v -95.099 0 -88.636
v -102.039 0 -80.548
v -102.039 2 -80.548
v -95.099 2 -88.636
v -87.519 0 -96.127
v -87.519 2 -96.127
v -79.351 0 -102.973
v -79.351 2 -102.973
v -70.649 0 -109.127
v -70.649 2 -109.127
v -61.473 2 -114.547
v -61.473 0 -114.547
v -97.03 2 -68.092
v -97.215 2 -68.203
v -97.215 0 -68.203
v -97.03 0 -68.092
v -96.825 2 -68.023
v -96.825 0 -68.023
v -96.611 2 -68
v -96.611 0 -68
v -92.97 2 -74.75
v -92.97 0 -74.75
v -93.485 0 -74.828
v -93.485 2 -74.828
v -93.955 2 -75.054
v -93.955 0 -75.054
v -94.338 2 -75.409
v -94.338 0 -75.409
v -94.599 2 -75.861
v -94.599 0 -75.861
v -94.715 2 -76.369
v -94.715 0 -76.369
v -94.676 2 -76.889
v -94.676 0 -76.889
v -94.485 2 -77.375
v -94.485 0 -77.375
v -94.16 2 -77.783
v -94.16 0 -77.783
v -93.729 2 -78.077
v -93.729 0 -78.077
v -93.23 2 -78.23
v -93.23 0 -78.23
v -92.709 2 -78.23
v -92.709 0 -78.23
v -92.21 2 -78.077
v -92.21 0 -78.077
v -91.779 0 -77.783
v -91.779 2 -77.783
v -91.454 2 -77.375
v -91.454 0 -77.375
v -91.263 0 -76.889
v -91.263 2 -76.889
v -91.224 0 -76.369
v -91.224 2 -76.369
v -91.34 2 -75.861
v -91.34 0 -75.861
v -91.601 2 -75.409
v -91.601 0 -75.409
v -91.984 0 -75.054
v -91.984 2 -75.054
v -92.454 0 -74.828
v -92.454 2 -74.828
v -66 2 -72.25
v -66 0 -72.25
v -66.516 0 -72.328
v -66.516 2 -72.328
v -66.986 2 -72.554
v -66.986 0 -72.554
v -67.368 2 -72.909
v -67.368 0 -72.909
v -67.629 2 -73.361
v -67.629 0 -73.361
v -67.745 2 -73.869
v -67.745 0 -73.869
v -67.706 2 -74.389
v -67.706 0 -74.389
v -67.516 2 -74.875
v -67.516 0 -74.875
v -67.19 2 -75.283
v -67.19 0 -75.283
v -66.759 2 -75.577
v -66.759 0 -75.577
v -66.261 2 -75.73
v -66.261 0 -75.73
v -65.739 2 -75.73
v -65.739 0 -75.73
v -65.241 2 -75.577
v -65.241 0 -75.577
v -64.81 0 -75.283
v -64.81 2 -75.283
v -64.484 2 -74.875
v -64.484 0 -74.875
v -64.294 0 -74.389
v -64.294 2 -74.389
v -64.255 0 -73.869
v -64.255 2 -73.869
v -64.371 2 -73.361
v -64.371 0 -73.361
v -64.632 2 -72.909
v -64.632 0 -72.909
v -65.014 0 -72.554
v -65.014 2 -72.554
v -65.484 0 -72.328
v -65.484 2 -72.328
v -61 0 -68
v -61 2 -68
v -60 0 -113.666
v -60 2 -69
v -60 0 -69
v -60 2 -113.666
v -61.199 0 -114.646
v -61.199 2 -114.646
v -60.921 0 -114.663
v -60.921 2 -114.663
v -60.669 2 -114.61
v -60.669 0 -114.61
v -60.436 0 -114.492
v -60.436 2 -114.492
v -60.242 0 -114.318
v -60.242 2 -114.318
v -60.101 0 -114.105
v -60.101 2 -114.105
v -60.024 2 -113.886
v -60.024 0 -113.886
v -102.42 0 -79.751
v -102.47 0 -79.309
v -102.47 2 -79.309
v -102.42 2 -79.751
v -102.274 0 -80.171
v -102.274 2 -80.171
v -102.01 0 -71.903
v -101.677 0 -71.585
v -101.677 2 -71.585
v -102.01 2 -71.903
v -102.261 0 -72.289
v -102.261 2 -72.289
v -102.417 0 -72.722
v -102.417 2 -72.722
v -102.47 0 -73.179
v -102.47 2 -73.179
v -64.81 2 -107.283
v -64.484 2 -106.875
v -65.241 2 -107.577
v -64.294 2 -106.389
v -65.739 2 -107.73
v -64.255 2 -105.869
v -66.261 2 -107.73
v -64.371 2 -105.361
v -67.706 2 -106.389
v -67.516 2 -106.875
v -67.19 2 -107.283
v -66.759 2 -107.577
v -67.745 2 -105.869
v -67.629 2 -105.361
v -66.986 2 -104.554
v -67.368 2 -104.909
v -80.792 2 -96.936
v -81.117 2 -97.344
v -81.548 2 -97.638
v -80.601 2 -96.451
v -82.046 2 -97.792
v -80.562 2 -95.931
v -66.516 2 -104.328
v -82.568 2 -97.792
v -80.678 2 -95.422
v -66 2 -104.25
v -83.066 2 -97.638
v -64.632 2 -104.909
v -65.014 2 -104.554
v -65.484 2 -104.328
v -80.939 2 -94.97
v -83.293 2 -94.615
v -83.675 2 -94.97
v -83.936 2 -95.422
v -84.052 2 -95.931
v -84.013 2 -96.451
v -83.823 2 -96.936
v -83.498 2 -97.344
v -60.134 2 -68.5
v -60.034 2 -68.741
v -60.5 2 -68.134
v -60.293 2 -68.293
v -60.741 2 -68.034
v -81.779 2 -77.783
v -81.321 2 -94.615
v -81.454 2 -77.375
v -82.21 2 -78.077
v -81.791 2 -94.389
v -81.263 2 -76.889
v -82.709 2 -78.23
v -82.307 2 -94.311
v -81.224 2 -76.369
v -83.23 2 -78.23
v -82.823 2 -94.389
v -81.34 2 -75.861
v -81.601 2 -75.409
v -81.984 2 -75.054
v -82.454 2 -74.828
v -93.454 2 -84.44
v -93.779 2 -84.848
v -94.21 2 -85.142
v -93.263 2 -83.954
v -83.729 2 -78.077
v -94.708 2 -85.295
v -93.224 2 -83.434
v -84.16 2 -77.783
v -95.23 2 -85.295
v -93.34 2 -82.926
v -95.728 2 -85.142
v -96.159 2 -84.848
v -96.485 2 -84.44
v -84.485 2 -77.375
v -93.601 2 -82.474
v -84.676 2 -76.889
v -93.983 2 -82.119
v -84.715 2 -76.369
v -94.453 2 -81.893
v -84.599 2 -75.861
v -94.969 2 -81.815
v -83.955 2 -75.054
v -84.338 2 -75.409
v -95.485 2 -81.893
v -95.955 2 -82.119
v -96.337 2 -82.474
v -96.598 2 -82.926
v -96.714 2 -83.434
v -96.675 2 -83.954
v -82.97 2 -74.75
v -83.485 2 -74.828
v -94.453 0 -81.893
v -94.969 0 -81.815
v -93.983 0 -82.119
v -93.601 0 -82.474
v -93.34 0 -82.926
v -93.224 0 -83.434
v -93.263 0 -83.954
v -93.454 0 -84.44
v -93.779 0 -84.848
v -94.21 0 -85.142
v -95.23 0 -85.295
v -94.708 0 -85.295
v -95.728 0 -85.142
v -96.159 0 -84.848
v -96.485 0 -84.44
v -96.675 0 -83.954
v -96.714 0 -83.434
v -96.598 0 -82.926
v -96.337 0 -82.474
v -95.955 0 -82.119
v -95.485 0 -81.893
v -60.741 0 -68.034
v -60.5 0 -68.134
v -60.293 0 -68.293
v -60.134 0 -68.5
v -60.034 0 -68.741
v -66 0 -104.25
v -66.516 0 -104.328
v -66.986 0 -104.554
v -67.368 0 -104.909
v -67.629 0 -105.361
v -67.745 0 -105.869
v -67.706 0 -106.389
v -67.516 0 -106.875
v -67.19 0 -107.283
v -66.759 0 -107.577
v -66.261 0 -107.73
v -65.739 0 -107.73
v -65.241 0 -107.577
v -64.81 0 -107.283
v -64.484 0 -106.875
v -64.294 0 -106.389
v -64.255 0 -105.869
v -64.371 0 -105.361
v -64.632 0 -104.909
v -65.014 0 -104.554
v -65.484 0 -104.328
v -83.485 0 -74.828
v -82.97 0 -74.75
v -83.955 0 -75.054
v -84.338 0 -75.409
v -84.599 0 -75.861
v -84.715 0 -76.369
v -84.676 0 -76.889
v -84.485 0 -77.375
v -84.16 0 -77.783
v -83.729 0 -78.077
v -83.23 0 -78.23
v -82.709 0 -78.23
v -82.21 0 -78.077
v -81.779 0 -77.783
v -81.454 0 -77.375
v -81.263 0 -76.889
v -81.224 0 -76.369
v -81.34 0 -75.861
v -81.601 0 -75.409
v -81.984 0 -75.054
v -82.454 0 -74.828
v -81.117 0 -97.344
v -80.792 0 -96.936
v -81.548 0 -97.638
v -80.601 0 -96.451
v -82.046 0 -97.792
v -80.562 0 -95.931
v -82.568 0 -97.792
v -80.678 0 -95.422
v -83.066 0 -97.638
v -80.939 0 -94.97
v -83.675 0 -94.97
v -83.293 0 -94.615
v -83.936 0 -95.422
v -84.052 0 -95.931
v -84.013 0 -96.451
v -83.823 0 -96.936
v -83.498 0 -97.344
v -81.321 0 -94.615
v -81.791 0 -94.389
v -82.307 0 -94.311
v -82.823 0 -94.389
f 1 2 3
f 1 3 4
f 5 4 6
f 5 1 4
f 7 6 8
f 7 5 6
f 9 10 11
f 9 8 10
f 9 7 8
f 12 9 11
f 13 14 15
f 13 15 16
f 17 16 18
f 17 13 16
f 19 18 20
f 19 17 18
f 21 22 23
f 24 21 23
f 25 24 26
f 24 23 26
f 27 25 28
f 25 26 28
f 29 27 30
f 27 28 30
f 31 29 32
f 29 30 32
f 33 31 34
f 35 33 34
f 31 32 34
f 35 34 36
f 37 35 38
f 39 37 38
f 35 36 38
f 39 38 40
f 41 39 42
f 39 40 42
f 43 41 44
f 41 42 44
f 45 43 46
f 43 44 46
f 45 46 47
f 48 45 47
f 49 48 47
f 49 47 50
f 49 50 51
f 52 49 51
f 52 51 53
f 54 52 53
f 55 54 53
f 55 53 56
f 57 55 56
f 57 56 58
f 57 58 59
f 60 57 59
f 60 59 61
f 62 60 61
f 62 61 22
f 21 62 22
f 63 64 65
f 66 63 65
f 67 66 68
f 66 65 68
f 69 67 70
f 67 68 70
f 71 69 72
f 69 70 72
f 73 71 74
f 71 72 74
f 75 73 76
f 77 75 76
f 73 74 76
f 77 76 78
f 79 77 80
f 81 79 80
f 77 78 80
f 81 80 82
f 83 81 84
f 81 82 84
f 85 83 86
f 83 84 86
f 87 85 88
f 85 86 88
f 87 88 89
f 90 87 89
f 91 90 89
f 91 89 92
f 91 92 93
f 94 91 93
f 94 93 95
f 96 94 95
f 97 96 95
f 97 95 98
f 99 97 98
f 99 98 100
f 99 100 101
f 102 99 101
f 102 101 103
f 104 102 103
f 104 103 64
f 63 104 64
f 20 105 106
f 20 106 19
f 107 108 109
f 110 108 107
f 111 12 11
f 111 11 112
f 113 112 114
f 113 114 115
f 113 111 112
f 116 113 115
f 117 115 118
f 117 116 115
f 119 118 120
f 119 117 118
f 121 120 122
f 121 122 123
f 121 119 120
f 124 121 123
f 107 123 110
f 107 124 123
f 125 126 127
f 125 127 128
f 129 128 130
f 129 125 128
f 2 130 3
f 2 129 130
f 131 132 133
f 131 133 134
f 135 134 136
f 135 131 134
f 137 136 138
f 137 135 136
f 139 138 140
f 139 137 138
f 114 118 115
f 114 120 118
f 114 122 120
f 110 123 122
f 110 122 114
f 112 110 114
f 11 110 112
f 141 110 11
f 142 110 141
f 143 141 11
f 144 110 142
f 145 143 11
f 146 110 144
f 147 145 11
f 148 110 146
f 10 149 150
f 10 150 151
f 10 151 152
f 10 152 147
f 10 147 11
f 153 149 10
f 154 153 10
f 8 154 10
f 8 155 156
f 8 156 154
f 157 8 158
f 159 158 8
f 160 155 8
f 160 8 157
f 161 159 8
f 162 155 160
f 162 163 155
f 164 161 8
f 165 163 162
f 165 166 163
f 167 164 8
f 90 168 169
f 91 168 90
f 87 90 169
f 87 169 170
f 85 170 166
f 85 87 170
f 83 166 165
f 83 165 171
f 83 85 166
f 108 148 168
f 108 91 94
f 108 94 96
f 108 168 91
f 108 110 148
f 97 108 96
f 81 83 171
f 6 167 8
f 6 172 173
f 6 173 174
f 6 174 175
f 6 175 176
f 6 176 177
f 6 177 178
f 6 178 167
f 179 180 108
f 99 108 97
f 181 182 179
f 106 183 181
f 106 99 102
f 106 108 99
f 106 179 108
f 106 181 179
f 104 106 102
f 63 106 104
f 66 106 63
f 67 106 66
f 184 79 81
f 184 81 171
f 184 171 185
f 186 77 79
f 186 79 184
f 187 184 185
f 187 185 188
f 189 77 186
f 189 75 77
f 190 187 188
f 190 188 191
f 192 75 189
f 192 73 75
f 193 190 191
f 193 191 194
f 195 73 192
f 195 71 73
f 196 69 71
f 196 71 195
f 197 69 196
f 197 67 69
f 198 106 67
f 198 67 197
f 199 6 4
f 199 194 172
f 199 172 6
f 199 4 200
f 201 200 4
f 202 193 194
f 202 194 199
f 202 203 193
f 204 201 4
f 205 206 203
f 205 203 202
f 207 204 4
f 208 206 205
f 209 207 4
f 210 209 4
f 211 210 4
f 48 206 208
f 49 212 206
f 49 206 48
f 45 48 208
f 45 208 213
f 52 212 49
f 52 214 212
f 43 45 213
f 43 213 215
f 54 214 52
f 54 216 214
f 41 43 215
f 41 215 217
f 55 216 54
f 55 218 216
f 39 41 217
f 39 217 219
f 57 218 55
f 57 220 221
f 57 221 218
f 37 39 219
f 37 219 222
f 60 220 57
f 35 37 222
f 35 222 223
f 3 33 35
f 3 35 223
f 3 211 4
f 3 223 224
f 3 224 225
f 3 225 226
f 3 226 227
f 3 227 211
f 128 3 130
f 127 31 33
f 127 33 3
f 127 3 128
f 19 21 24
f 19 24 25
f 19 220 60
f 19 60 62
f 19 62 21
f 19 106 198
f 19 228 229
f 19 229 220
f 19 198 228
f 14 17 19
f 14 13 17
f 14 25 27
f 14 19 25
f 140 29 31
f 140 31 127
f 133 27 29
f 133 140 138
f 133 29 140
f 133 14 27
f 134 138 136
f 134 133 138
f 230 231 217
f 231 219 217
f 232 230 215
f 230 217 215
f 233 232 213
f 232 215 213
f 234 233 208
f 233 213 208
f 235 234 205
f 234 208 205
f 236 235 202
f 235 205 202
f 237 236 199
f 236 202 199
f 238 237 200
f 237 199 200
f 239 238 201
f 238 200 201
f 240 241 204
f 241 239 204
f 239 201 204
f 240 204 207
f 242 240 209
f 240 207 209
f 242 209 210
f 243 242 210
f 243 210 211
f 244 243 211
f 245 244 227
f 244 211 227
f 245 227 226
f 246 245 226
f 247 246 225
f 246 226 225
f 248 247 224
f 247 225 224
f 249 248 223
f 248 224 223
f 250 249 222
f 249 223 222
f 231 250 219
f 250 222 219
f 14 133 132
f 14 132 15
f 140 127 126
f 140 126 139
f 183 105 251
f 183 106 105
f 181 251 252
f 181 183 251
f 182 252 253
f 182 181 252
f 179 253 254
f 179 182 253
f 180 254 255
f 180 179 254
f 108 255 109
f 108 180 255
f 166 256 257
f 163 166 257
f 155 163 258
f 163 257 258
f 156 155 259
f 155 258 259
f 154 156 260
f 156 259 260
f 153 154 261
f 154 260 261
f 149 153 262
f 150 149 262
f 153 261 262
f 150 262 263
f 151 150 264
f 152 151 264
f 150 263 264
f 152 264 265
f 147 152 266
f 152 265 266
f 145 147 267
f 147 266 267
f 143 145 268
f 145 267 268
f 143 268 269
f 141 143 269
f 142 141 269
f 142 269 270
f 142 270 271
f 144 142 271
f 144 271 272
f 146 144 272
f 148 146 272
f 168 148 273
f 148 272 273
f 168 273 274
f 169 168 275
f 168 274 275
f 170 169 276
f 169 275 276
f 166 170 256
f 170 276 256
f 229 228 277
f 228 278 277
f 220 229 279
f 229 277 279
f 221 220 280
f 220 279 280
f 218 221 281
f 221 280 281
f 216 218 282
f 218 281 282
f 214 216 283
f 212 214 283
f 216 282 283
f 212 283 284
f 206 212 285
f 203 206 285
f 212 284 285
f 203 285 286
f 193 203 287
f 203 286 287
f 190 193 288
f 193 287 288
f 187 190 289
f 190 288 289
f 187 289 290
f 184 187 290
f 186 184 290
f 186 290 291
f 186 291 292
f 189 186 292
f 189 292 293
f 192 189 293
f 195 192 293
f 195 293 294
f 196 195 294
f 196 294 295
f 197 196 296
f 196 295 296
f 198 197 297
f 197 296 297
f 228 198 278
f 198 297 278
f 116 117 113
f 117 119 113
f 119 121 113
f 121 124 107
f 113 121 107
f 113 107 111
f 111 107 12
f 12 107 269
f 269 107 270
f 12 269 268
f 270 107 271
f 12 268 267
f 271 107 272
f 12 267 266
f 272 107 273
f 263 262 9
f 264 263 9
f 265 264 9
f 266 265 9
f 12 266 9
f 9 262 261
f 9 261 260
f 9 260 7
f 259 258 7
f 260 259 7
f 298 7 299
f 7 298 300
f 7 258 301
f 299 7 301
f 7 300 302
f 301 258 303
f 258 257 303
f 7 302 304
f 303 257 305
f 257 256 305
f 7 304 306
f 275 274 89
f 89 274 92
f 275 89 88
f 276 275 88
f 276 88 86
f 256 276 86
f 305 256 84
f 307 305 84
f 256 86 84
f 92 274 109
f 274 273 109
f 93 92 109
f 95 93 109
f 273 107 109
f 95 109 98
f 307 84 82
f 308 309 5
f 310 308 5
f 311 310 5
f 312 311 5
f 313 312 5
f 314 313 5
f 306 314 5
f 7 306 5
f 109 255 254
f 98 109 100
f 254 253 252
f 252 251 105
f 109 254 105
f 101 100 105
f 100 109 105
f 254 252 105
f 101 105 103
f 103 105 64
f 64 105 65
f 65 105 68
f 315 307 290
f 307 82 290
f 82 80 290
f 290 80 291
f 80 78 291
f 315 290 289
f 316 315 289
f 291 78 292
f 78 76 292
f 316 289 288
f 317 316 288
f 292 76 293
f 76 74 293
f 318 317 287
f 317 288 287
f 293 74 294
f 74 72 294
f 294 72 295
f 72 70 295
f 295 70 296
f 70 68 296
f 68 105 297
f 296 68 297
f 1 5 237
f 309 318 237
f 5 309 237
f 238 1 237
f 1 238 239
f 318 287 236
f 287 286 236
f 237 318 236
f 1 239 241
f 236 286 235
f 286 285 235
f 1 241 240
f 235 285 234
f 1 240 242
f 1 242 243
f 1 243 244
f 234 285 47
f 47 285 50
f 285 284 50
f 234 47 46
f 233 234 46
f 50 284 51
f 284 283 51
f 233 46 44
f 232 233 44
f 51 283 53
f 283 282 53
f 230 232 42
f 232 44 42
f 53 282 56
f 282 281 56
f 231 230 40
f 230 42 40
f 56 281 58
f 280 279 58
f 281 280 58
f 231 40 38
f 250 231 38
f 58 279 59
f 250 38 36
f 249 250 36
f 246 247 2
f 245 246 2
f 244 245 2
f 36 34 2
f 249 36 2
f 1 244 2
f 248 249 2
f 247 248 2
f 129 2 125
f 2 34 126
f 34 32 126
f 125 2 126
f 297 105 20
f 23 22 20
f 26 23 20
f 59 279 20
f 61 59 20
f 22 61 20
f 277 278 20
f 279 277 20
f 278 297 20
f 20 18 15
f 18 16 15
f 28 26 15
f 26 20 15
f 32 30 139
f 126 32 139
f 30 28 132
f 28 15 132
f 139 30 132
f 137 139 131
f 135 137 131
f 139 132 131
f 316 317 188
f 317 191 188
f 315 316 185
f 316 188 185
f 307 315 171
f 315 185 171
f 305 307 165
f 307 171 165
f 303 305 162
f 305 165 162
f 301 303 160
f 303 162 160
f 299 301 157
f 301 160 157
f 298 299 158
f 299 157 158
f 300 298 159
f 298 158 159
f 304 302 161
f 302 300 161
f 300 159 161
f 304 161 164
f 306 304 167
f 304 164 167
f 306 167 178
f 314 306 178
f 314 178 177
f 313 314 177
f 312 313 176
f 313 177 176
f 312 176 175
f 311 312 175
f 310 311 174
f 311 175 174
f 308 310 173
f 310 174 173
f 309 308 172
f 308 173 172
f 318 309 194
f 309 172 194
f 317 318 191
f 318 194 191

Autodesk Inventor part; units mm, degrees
ref_plane "YZ Plane" through (0, 0, 0) normal (1, 0, 0) x (0, 1, 0)
ref_plane "XZ Plane" through (0, 0, 0) normal (0, 1, 0) x (-1, 0, 0)
ref_plane "XY Plane" through (0, 0, 0) normal (0, 0, 1) x (1, 0, 0)
sketch "スケッチ1" plane through (0, 0, 0) normal (0, 1, 0) x (-1, 0, 0)
  circle A0 centre (0, 0) radius 130
  dimension "d0" = 260
extrude "プレート1" add sketch "スケッチ1" along normal blind 2
sketch "スケッチ2" plane through (0, 2, 0) normal (0, 1, 0) x (1, 0, 0)
  line L0 (85, -40) -> (109, -40)
  line L1 (109, -40) -> (109, 40)
  line L2 (109, 40) -> (85, 40)
  line L3 (85, 40) -> (85, -40)
  line L4 (85, -40) -> (109, 40) construction
  line L5 (109, -40) -> (85, 40) construction
  point P0 (0, 0)
  point P1 (97, 0)
  dimension "d2" = 24
  dimension "d3" = 85
  dimension "d6" = 80
extrude "押し出し1" cut sketch "スケッチ2" against normal through all
fillet "フィレット1" radius 10 4 edges at (109, 1, 40) (85, 1, 40) (85, 1, -40) (109, 1, -40)
sketch "スケッチ3" plane through (0, 2, 0) normal (0, 1, 0) x (1, 0, 0)
  line L0 (85, -30) -> (85, 30) projected
  line L1 (109, 30) -> (109, -30) projected
  line L2 (95, 40) -> (99, 40) projected
  line L3 (99, -40) -> (95, -40) projected
  line L4 (82, -20) -> (112, -20) construction
  line L5 (112, -20) -> (112, 20) construction
  line L6 (112, 20) -> (82, 20) construction
  line L7 (82, 20) -> (82, -20) construction
  line L8 (82, -20) -> (112, 20) construction
  line L9 (112, -20) -> (82, 20) construction
  point P0 (0, 0)
  point P1 (97, 0)
  point P2 (97, 40)
  point P3 (109, 0)
  dimension "d8" = 30
  dimension "d9" = 40
hole "穴1" at (82, 2, 20) at (112, 2, 20) at (112, 2, -20) at (82, 2, -20) direction (0, -1, 0) diameter 3.5 depth 2 tip angle 118
sketch "スケッチ4" plane through (0, 2, 0) normal (0, 1, 0) x (1, 0, 0)
  circle A0 centre (0, 0) radius 130 projected
  line L0 (-106.1838, 75) -> (-60, 40)
  line L1 (-60, 40) -> (-60, -40)
  line L2 (-60, -40) -> (-106.1838, -75)
  point P0 (-60, 0)
  dimension "d17" = 40
  dimension "d18" = 75
  dimension "d19" = 60
extrude "押し出し2" cut sketch "スケッチ4" against normal through all contours L0 L1 L2 A0 picked at (-83.3333, 0)
sketch "スケッチ5" plane through (0, 2, 0) normal (0, 1, 0) x (1, 0, 0)
  line L0 (-47.5, 87) -> (47.5, 87)
  line L1 (47.5, 87) -> (47.5, 106)
  line L2 (47.5, 106) -> (-47.5, 106)
  line L3 (-47.5, 106) -> (-47.5, 87)
  line L4 (-47.5, 87) -> (47.5, 106) construction
  line L5 (47.5, 87) -> (-47.5, 106) construction
  line L6 (-13.5, 81.5) -> (13.5, 81.5)
  line L7 (13.5, 81.5) -> (13.5, 87)
  line L8 (13.5, 87) -> (-13.5, 87)
  line L9 (-13.5, 87) -> (-13.5, 81.5)
  line L10 (-13.5, 81.5) -> (13.5, 87) construction
  line L11 (13.5, 81.5) -> (-13.5, 87) construction
  line L12 (-13.5, 81.5) -> (-12.7575, 82.2425) construction
  line L13 (-13.5, 81.5) -> (-12.45, 81.5) construction
  line L14 (13.5, 81.5) -> (12.7575, 82.2425) construction
  line L15 (13.5, 81.5) -> (14.55, 81.5) construction
  circle A0 centre (12.7575, 82.2425) radius 1.05
  circle A1 centre (-12.7575, 82.2425) radius 1.05
  line L16 (47.5, 87) -> (62.5, 87)
  line L17 (62.5, 87) -> (62.5, 97)
  line L18 (62.5, 97) -> (47.5, 97)
  line L19 (47.5, 97) -> (47.5, 87)
  line L20 (-13.5, 111.5) -> (13.5, 111.5)
  line L21 (13.5, 111.5) -> (13.5, 106)
  line L22 (13.5, 106) -> (-13.5, 106)
  line L23 (-13.5, 106) -> (-13.5, 111.5)
  line L24 (-13.5, 111.5) -> (13.5, 106) construction
  line L25 (13.5, 111.5) -> (-13.5, 106) construction
  line L26 (-13.5, 111.5) -> (-12.7575, 110.7575) construction
  line L27 (-13.5, 111.5) -> (-12.45, 111.5) construction
  line L28 (13.5, 111.5) -> (12.7575, 110.7575) construction
  line L29 (13.5, 111.5) -> (14.55, 111.5) construction
  circle A2 centre (-12.7575, 110.7575) radius 1.05
  circle A3 centre (12.7575, 110.7575) radius 1.05
  point P0 (0, 0)
  point P1 (0, 96.5)
  point P2 (0, 84.25)
  point P3 (-13.5, 82.9849)
  point P4 (-12.0151, 81.5)
  point P5 (12.0151, 81.5)
  point P6 (13.5, 82.9849)
  point P7 (47.5, 97)
  point P8 (0, 108.75)
  point P9 (-13.5, 110.0151)
  point P10 (13.5, 110.0151)
  point P11 (12.0151, 111.5)
  point P12 (-12.0151, 111.5)
  dimension "d22" = 19
  dimension "d23" = 95
  dimension "d24" = 87
  dimension "d25" = 5.5
  dimension "d26" = 27
  dimension "d27" = 1.05
  dimension "d28" = 45
  dimension "d29" = 1.05
  dimension "d30" = 135
  dimension "d44" = 10
  dimension "d45" = 15
  dimension "d46" = 5.5
  dimension "d47" = 1.05
  dimension "d48" = 45
  dimension "d49" = 1.05
  dimension "d50" = 135
extrude "押し出し3" cut sketch "スケッチ5" against normal through all
sketch "スケッチ6" plane through (0, 2, 0) normal (0, 1, 0) x (1, 0, 0)
  line L0 (-20, 84) -> (20, 84) construction
  line L1 (-20, 84) -> (20, 84) construction
  line L2 (12.0151, 81.5) -> (-12.0151, 81.5) construction
  line L3 (-20, 109) -> (20, 109) construction
  line L4 (13.5, 106) -> (47.5, 106) construction
  line L5 (-20, 109) -> (20, 109) construction
  line L6 (-12.0151, 111.5) -> (12.0151, 111.5) construction
  point P0 (0, 0)
  point P1 (0, 84)
  point P2 (0, 109)
  point P3 (0, 84)
  dimension "d33" = 40
  dimension "d34" = 0
  dimension "d35" = 2.5
  dimension "d51" = 40
  dimension "d52" = 0
  dimension "d53" = 2.5
hole "穴2" at (20, 2, -84) at (-20, 2, -84) at (-20, 2, -109) at (20, 2, -109) direction (0, -1, 0) diameter 3.5 depth 2 tip angle 118
fillet "フィレット2" radius 1 4 edges at (-13.5, 1, -87) (13.5, 1, -87) (-13.5, 1, -106) (13.5, 1, -106)
fillet "フィレット3" radius 3 6 edges at (-47.5, 1, -87) (-47.5, 1, -106) (47.5, 1, -106) (47.5, 1, -97) (62.5, 1, -97) (62.5, 1, -87)
mirror "ミラー1" about plane through (0, 0, 0) normal (0, 0, 1) of "穴2", "押し出し3", "フィレット2", "フィレット3"
sketch "スケッチ7" plane through (0, 2, 0) normal (0, 1, 0) x (1, 0, 0)
  arc A0 (-106.1838, -75) -> (-106.1838, 75) centre (0, 0) ccw projected
  line L0 (-48.7827, 120.5) -> (48.7827, 120.5)
  line L1 (-48.7827, -120.5) -> (48.7827, -120.5)
  line L2 (123, -42.0833) -> (123, 42.0833)
  line L3 (-12.0151, 111.5) -> (12.0151, 111.5) projected
  circle A1 centre (112, 20) radius 1.75 projected
  line L4 (12.0151, -111.5) -> (-12.0151, -111.5) projected
  dimension "d55" = 9
  dimension "d56" = 11
  dimension "d57" = 9
extrude "押し出し4" cut sketch "スケッチ7" against normal through all contours L1 A0 | L2 A0 | L0 A0
fillet "フィレット4" radius 50 6 edges at (48.7827, 1, 120.5) (-48.7827, 1, 120.5) (123, 1, -42.0833) (123, 1, 42.0833) (-48.7827, 1, -120.5) (48.7827, 1, -120.5)
sketch "スケッチ8" plane through (0, 0, 0) normal (0, -1, 0) x (1, 0, 0)
  arc A0 (97.4046, 79.5902) -> (95.9996, 79.4659) centre (96.7931, 78.5) ccw projected
  arc A1 (52.5865, 79.4659) -> (51.1816, 79.5902) centre (51.7931, 78.5) ccw projected
  point P0 (0, 0)
hole "穴3" at (96.7931, 0, 78.5) at (51.7931, 0, 78.5) direction (0, 1, 0) diameter 3.5 depth 2 tip angle 118
sketch "スケッチ10" plane through (0, 2, 0) normal (0, 1, 0) x (1, 0, 0)
  line L0 (-32.5, -116.5) -> (32.5, -116.5) construction
  line L1 (-32.5, -116.5) -> (32.5, -116.5) construction
  line L2 (-37.812, -120.5) -> (37.812, -120.5) construction
  point P0 (0, 0)
  point P1 (0, -116.5)
  dimension "d78" = 65
  dimension "d79" = 0
  dimension "d80" = 4
hole "穴5" at (32.5, 2, 116.5) at (-32.5, 2, 116.5) direction (0, -1, 0) diameter 3.5 end through all
mirror "ミラー2" about plane through (0, 0, 0) normal (0, 0, 1) of "穴3", "穴5"
sketch "スケッチ9" plane through (0, 2, 0) normal (0, 1, 0) x (1, 0, 0)
  line L0 (110, -55) -> (110, 55) construction
  line L1 (109, 30) -> (109, -30) construction
  line L2 (110, -55) -> (220, -55) construction
  point P0 (0, 0)
  point P1 (110, 0)
  dimension "d68" = 110
  dimension "d69" = 90
  dimension "d70" = 110
hole "穴4" at (110, 2, 55) at (110, 2, -55) direction (0, -1, 0) diameter 3.5 depth 2 tip angle 118
sketch "スケッチ11" plane through (0, 2, 0) normal (0, 1, 0) x (1, 0, 0)
  line L0 (-45, 7.5) -> (40, 7.5) construction
  line L1 (40, 7.5) -> (40, 72.5) construction
  line L2 (40, 72.5) -> (-45, 72.5) construction
  line L3 (-45, 72.5) -> (-45, 7.5) construction
  line L4 (-45, 7.5) -> (40, 72.5) construction
  line L5 (40, 7.5) -> (-45, 72.5) construction
  line L6 (-60, 40) -> (-60, -40) construction
  point P0 (0, 0)
  point P1 (-2.5, 40)
  dimension "d88" = 85
  dimension "d89" = 65
  dimension "d90" = 7.5
  dimension "d91" = 15
hole "穴6" at (-45, 2, -7.5) at (40, 2, -7.5) at (40, 2, -72.5) at (-45, 2, -72.5) direction (0, -1, 0) diameter 2.5 end through all
sketch "スケッチ12" plane through (0, 2, 0) normal (0, 1, 0) x (1, 0, 0)
  line L0 (-15, 40) -> (10, 40) construction
  line L1 (-15, 10) -> (10, 10)
  line L2 (10, 70) -> (-15, 70)
  arc A0 (-15, 70) -> (-15, 10) centre (-15, 40) ccw
  arc A1 (10, 10) -> (10, 70) centre (10, 40) ccw
  circle A2 centre (-45, 72.5) radius 1.25 projected
  circle A3 centre (-45, 7.5) radius 1.25 projected
  point P0 (0, 0)
  point P1 (-2.5, 40)
  dimension "d99" = 25
  dimension "d100" = 30
  dimension "d101" = 42.5
  dimension "d102" = 32.5
extrude "押し出し5" cut sketch "スケッチ12" against normal through all contours A0 L2 A1 L1
mirror "ミラー3" about plane through (0, 0, 0) normal (0, 0, 1) of "穴6", "押し出し5"
sketch "スケッチ13" plane through (0, 2, 0) normal (0, 1, 0) x (1, 0, 0)
  line L0 (-15, 0) -> (15, 0) construction
  line L1 (-15, 0) -> (15, 0) construction
  point P0 (0, 0)
  point P1 (0, 0)
  dimension "d105" = 30
  dimension "d106" = 0
hole "穴7" at (-15, 2, 0) at (15, 2, 0) direction (0, -1, 0) diameter 2.5 end through all
sketch "スケッチ14" plane through (0, 2, 0) normal (0, 1, 0) x (1, 0, 0)
  line L0 (-106.1838, 75) -> (-60, 40) projected
  arc A0 (-61.4446, 114.5625) -> (-106.1838, 75) centre (0, 0) ccw projected
  line L1 (-60, -40) -> (-106.1838, -75) projected
  arc A1 (-106.1838, -75) -> (-61.4446, -114.5625) centre (0, 0) ccw projected
  line L2 (-102.4695, 80) -> (-102.4695, -80)
  line L3 (-102.4695, 80) -> (57.5305, 80) construction
  point P0 (-102.4695, 72.1852)
  point P1 (-102.4695, -72.1852)
  dimension "d114" = 160
  dimension "d115" = 90
extrude "押し出し6" cut sketch "スケッチ14" against normal through all
sketch "スケッチ15" plane through (0, 2, 0) normal (0, 1, 0) x (1, 0, 0)
  line L0 (-92.9695, -76.5) -> (-82.9695, -76.5) construction
  line L1 (-82.9695, -76.5) -> (-82.9695, 76.5) construction
  line L2 (-82.9695, 76.5) -> (-92.9695, 76.5) construction
  line L3 (-92.9695, 76.5) -> (-92.9695, -76.5) construction
  line L4 (-92.9695, -76.5) -> (-82.9695, 76.5) construction
  line L5 (-82.9695, -76.5) -> (-92.9695, 76.5) construction
  line L6 (-102.4695, 80) -> (-102.4695, 72.1852) construction
  point P0 (0, 0)
  point P1 (-87.9695, 0)
  dimension "d118" = 10
  dimension "d119" = 153
  dimension "d120" = 9.5
hole "穴8" at (-92.9695, 2, -76.5) at (-82.9695, 2, -76.5) at (-82.9695, 2, 76.5) at (-92.9695, 2, 76.5) direction (0, -1, 0) diameter 3.5 end through all
sketch "スケッチ16" plane through (0, 0, 0) normal (0, -1, 0) x (1, 0, 0)
  circle A0 centre (-94.9691, 83.565) radius 1.75 projected
  circle A1 centre (-82.3072, 96.0613) radius 1.75 projected
  circle A2 centre (-94.9691, 83.565) radius 1.75 projected
  point P0 (0, 0)
hole "穴9" at (-94.9691, 0, 83.565) at (-82.3072, 0, 96.0613) direction (0, 1, 0) diameter 3.5 depth 2
mirror "ミラー4" about plane through (0, 0, 0) normal (0, 0, 1) of "穴9"
fillet "フィレット5" radius 2 6 edges at (-102.4695, 1, -72.1852) (-102.4695, 1, -80) (-102.4695, 1, 80) (-60, 1, -40) (-60, 1, 40) (-102.4695, 1, 72.1852)
sketch "スケッチ20" plane through (0, 2, 0) normal (0, 1, 0) x (1, 0, 0)
  line L0 (-60, 39.0062) -> (-60, -39.0062) projected
  arc A0 (-61.4446, 114.5625) -> (-102.0393, 80.548) centre (0, 0) ccw projected
  arc A1 (-102.0393, -80.548) -> (-61.4446, -114.5625) centre (0, 0) ccw projected
  arc A2 (-61.4446, -114.5625) -> (-37.812, -120.5) centre (-37.812, -70.5) ccw projected
  arc A3 (-37.812, 120.5) -> (-61.4446, 114.5625) centre (-37.812, 70.5) ccw projected
  line L1 (-60, 39.0062) -> (-60, 115.3073) construction
  line L2 (-60, -39.0062) -> (-60, -115.3073) construction
  line L3 (-66, 74) -> (-54, 74) construction
  line L4 (-54, 74) -> (-54, 106) construction
  line L5 (-54, 106) -> (-66, 106) construction
  line L6 (-66, 106) -> (-66, 74) construction
  line L7 (-66, 74) -> (-54, 106) construction
  line L8 (-54, 74) -> (-66, 106) construction
  line L9 (-66, -106) -> (-54, -106) construction
  line L10 (-54, -106) -> (-54, -74) construction
  line L11 (-54, -74) -> (-66, -74) construction
  line L12 (-66, -74) -> (-66, -106) construction
  line L13 (-66, -106) -> (-54, -74) construction
  line L14 (-54, -106) -> (-66, -74) construction
  point P0 (-60, 90)
  point P1 (-60, -90)
  dimension "d155" = 12
  dimension "d156" = 32
  dimension "d157" = 12
  dimension "d158" = 32
  dimension "d169" = 90
  dimension "d170" = 90
hole "穴10" at (-54, 2, -74) at (-66, 2, -74) at (-66, 2, -106) at (-54, 2, -106) at (-66, 2, 74) at (-54, 2, 74) at (-54, 2, 106) at (-66, 2, 106) direction (0, -1, 0) diameter 3.5 depth 2
sketch "スケッチ21" plane through (0, 2, 0) normal (0, 1, 0) x (1, 0, 0)
  line L0 (-60, 39.0062) -> (-60, -39.0062) projected
  arc A0 (-61.4446, -114.5625) -> (-37.812, -120.5) centre (-37.812, -70.5) ccw projected
  arc A1 (-37.812, 120.5) -> (-61.4446, 114.5625) centre (-37.812, 70.5) ccw projected
  arc A2 (-61.4446, 114.5625) -> (-102.0393, 80.548) centre (0, 0) ccw projected
  arc A3 (-102.0393, -80.548) -> (-61.4446, -114.5625) centre (0, 0) ccw projected
  line L1 (-60, 39.0062) -> (-60, 115.3073)
  line L2 (-60.792, -40.6002) -> (-101.6775, -71.5849) projected
  line L3 (-60, -39.0062) -> (-60, -115.3073)
  line L4 (-102.4695, -73.1789) -> (-102.4695, -79.3088) projected
  arc A4 (-101.6775, -71.5849) -> (-102.4695, -73.1789) centre (-100.4695, -73.1789) ccw projected
  arc A5 (-102.4695, -79.3088) -> (-102.0393, -80.548) centre (-100.4695, -79.3088) ccw projected
  line L5 (-101.6775, 71.5849) -> (-60.792, 40.6002) projected
  line L6 (-102.4695, 79.3088) -> (-102.4695, 73.1789) projected
  arc A6 (-102.4695, 73.1789) -> (-101.6775, 71.5849) centre (-100.4695, 73.1789) ccw projected
  arc A7 (-102.0393, 80.548) -> (-102.4695, 79.3088) centre (-100.4695, 79.3088) ccw projected
  arc A8 (-60, 39.0062) -> (-60.792, 40.6002) centre (-62, 39.0062) ccw projected
  line L7 (37.812, 120.5) -> (-37.812, 120.5) projected
  arc A9 (61.4446, 114.5625) -> (37.812, 120.5) centre (37.812, 70.5) ccw projected
  arc A10 (118.625, 53.18) -> (61.4446, 114.5625) centre (0, 0) ccw projected
  line L8 (123, -32.7261) -> (123, 32.7261) projected
  arc A11 (123, 32.7261) -> (118.625, 53.18) centre (73, 32.7261) ccw projected
  arc A12 (118.625, -53.18) -> (123, -32.7261) centre (73, -32.7261) ccw projected
  arc A13 (61.4446, -114.5625) -> (118.625, -53.18) centre (0, 0) ccw projected
  arc A14 (37.812, -120.5) -> (61.4446, -114.5625) centre (37.812, -70.5) ccw projected
  line L9 (-37.812, -120.5) -> (37.812, -120.5) projected
  arc A15 (-60.792, -40.6002) -> (-60, -39.0062) centre (-62, -39.0062) ccw projected
  point P0 (-60.0015, 39.0827)
extrude "押し出し10" cut sketch "スケッチ21" against normal through all contours L1 A1 L7 A9 A10 A11 L8 A12 A13 A14 L9 A0 L3 L0 | L3 A0 A3 A5 L4 A4 L2 A15
sketch "スケッチ22" plane through (0, 0, 0) normal (0, -1, 0) x (1, 0, 0)
  line L0 (-60.792, -40.6002) -> (-101.6775, -71.5849) projected
  line L1 (-60, -115.3073) -> (-60, -39.0062) projected
  arc A0 (-60.792, -40.6002) -> (-60, -39.0062) centre (-62, -39.0062) ccw projected
  line L2 (-60, -68) -> (-96.947, -68)
  circle A1 centre (-66, -74) radius 1.75 projected
  point P0 (0, 0)
  dimension "d171" = 6
extrude "押し出し11" cut sketch "スケッチ22" against normal through all contours A0 L1 L2 L0
fillet "フィレット6" radius 1 3 edges at (-60, 1, -115.3073) (-96.947, 1, -68) (-60, 1, -68)
equation "\"d15\" = Thickness"
equation "\"d46\" = d25"
equation "\"d53\" = d35"
equation "\"d41\" = Thickness"
equation "\"d57\" = d55"
equation "\"d66\" = Thickness"
equation "\"d86\" = Thickness"
equation "\"d76\" = Thickness"
equation "\"d1\" = Thickness"
equation "\"BendRadius\" = Thickness"
equation "\"BendReliefWidth\" = Thickness"
equation "\"BendReliefDepth\" = 0.5 * Thickness"
equation "\"CornerReliefSize\" = 4 * Thickness"
equation "\"MinimumRemnant\" = 2 * Thickness"
equation "\"TransitionRadius\" = BendRadius"
equation "\"JacobiRadiusSize\" = BendRadius"
equation "\"GapSize\" = Thickness"
equation "\"Thickness\" = 2"
properties part number "T2.0_frame-base1_extend-1"
